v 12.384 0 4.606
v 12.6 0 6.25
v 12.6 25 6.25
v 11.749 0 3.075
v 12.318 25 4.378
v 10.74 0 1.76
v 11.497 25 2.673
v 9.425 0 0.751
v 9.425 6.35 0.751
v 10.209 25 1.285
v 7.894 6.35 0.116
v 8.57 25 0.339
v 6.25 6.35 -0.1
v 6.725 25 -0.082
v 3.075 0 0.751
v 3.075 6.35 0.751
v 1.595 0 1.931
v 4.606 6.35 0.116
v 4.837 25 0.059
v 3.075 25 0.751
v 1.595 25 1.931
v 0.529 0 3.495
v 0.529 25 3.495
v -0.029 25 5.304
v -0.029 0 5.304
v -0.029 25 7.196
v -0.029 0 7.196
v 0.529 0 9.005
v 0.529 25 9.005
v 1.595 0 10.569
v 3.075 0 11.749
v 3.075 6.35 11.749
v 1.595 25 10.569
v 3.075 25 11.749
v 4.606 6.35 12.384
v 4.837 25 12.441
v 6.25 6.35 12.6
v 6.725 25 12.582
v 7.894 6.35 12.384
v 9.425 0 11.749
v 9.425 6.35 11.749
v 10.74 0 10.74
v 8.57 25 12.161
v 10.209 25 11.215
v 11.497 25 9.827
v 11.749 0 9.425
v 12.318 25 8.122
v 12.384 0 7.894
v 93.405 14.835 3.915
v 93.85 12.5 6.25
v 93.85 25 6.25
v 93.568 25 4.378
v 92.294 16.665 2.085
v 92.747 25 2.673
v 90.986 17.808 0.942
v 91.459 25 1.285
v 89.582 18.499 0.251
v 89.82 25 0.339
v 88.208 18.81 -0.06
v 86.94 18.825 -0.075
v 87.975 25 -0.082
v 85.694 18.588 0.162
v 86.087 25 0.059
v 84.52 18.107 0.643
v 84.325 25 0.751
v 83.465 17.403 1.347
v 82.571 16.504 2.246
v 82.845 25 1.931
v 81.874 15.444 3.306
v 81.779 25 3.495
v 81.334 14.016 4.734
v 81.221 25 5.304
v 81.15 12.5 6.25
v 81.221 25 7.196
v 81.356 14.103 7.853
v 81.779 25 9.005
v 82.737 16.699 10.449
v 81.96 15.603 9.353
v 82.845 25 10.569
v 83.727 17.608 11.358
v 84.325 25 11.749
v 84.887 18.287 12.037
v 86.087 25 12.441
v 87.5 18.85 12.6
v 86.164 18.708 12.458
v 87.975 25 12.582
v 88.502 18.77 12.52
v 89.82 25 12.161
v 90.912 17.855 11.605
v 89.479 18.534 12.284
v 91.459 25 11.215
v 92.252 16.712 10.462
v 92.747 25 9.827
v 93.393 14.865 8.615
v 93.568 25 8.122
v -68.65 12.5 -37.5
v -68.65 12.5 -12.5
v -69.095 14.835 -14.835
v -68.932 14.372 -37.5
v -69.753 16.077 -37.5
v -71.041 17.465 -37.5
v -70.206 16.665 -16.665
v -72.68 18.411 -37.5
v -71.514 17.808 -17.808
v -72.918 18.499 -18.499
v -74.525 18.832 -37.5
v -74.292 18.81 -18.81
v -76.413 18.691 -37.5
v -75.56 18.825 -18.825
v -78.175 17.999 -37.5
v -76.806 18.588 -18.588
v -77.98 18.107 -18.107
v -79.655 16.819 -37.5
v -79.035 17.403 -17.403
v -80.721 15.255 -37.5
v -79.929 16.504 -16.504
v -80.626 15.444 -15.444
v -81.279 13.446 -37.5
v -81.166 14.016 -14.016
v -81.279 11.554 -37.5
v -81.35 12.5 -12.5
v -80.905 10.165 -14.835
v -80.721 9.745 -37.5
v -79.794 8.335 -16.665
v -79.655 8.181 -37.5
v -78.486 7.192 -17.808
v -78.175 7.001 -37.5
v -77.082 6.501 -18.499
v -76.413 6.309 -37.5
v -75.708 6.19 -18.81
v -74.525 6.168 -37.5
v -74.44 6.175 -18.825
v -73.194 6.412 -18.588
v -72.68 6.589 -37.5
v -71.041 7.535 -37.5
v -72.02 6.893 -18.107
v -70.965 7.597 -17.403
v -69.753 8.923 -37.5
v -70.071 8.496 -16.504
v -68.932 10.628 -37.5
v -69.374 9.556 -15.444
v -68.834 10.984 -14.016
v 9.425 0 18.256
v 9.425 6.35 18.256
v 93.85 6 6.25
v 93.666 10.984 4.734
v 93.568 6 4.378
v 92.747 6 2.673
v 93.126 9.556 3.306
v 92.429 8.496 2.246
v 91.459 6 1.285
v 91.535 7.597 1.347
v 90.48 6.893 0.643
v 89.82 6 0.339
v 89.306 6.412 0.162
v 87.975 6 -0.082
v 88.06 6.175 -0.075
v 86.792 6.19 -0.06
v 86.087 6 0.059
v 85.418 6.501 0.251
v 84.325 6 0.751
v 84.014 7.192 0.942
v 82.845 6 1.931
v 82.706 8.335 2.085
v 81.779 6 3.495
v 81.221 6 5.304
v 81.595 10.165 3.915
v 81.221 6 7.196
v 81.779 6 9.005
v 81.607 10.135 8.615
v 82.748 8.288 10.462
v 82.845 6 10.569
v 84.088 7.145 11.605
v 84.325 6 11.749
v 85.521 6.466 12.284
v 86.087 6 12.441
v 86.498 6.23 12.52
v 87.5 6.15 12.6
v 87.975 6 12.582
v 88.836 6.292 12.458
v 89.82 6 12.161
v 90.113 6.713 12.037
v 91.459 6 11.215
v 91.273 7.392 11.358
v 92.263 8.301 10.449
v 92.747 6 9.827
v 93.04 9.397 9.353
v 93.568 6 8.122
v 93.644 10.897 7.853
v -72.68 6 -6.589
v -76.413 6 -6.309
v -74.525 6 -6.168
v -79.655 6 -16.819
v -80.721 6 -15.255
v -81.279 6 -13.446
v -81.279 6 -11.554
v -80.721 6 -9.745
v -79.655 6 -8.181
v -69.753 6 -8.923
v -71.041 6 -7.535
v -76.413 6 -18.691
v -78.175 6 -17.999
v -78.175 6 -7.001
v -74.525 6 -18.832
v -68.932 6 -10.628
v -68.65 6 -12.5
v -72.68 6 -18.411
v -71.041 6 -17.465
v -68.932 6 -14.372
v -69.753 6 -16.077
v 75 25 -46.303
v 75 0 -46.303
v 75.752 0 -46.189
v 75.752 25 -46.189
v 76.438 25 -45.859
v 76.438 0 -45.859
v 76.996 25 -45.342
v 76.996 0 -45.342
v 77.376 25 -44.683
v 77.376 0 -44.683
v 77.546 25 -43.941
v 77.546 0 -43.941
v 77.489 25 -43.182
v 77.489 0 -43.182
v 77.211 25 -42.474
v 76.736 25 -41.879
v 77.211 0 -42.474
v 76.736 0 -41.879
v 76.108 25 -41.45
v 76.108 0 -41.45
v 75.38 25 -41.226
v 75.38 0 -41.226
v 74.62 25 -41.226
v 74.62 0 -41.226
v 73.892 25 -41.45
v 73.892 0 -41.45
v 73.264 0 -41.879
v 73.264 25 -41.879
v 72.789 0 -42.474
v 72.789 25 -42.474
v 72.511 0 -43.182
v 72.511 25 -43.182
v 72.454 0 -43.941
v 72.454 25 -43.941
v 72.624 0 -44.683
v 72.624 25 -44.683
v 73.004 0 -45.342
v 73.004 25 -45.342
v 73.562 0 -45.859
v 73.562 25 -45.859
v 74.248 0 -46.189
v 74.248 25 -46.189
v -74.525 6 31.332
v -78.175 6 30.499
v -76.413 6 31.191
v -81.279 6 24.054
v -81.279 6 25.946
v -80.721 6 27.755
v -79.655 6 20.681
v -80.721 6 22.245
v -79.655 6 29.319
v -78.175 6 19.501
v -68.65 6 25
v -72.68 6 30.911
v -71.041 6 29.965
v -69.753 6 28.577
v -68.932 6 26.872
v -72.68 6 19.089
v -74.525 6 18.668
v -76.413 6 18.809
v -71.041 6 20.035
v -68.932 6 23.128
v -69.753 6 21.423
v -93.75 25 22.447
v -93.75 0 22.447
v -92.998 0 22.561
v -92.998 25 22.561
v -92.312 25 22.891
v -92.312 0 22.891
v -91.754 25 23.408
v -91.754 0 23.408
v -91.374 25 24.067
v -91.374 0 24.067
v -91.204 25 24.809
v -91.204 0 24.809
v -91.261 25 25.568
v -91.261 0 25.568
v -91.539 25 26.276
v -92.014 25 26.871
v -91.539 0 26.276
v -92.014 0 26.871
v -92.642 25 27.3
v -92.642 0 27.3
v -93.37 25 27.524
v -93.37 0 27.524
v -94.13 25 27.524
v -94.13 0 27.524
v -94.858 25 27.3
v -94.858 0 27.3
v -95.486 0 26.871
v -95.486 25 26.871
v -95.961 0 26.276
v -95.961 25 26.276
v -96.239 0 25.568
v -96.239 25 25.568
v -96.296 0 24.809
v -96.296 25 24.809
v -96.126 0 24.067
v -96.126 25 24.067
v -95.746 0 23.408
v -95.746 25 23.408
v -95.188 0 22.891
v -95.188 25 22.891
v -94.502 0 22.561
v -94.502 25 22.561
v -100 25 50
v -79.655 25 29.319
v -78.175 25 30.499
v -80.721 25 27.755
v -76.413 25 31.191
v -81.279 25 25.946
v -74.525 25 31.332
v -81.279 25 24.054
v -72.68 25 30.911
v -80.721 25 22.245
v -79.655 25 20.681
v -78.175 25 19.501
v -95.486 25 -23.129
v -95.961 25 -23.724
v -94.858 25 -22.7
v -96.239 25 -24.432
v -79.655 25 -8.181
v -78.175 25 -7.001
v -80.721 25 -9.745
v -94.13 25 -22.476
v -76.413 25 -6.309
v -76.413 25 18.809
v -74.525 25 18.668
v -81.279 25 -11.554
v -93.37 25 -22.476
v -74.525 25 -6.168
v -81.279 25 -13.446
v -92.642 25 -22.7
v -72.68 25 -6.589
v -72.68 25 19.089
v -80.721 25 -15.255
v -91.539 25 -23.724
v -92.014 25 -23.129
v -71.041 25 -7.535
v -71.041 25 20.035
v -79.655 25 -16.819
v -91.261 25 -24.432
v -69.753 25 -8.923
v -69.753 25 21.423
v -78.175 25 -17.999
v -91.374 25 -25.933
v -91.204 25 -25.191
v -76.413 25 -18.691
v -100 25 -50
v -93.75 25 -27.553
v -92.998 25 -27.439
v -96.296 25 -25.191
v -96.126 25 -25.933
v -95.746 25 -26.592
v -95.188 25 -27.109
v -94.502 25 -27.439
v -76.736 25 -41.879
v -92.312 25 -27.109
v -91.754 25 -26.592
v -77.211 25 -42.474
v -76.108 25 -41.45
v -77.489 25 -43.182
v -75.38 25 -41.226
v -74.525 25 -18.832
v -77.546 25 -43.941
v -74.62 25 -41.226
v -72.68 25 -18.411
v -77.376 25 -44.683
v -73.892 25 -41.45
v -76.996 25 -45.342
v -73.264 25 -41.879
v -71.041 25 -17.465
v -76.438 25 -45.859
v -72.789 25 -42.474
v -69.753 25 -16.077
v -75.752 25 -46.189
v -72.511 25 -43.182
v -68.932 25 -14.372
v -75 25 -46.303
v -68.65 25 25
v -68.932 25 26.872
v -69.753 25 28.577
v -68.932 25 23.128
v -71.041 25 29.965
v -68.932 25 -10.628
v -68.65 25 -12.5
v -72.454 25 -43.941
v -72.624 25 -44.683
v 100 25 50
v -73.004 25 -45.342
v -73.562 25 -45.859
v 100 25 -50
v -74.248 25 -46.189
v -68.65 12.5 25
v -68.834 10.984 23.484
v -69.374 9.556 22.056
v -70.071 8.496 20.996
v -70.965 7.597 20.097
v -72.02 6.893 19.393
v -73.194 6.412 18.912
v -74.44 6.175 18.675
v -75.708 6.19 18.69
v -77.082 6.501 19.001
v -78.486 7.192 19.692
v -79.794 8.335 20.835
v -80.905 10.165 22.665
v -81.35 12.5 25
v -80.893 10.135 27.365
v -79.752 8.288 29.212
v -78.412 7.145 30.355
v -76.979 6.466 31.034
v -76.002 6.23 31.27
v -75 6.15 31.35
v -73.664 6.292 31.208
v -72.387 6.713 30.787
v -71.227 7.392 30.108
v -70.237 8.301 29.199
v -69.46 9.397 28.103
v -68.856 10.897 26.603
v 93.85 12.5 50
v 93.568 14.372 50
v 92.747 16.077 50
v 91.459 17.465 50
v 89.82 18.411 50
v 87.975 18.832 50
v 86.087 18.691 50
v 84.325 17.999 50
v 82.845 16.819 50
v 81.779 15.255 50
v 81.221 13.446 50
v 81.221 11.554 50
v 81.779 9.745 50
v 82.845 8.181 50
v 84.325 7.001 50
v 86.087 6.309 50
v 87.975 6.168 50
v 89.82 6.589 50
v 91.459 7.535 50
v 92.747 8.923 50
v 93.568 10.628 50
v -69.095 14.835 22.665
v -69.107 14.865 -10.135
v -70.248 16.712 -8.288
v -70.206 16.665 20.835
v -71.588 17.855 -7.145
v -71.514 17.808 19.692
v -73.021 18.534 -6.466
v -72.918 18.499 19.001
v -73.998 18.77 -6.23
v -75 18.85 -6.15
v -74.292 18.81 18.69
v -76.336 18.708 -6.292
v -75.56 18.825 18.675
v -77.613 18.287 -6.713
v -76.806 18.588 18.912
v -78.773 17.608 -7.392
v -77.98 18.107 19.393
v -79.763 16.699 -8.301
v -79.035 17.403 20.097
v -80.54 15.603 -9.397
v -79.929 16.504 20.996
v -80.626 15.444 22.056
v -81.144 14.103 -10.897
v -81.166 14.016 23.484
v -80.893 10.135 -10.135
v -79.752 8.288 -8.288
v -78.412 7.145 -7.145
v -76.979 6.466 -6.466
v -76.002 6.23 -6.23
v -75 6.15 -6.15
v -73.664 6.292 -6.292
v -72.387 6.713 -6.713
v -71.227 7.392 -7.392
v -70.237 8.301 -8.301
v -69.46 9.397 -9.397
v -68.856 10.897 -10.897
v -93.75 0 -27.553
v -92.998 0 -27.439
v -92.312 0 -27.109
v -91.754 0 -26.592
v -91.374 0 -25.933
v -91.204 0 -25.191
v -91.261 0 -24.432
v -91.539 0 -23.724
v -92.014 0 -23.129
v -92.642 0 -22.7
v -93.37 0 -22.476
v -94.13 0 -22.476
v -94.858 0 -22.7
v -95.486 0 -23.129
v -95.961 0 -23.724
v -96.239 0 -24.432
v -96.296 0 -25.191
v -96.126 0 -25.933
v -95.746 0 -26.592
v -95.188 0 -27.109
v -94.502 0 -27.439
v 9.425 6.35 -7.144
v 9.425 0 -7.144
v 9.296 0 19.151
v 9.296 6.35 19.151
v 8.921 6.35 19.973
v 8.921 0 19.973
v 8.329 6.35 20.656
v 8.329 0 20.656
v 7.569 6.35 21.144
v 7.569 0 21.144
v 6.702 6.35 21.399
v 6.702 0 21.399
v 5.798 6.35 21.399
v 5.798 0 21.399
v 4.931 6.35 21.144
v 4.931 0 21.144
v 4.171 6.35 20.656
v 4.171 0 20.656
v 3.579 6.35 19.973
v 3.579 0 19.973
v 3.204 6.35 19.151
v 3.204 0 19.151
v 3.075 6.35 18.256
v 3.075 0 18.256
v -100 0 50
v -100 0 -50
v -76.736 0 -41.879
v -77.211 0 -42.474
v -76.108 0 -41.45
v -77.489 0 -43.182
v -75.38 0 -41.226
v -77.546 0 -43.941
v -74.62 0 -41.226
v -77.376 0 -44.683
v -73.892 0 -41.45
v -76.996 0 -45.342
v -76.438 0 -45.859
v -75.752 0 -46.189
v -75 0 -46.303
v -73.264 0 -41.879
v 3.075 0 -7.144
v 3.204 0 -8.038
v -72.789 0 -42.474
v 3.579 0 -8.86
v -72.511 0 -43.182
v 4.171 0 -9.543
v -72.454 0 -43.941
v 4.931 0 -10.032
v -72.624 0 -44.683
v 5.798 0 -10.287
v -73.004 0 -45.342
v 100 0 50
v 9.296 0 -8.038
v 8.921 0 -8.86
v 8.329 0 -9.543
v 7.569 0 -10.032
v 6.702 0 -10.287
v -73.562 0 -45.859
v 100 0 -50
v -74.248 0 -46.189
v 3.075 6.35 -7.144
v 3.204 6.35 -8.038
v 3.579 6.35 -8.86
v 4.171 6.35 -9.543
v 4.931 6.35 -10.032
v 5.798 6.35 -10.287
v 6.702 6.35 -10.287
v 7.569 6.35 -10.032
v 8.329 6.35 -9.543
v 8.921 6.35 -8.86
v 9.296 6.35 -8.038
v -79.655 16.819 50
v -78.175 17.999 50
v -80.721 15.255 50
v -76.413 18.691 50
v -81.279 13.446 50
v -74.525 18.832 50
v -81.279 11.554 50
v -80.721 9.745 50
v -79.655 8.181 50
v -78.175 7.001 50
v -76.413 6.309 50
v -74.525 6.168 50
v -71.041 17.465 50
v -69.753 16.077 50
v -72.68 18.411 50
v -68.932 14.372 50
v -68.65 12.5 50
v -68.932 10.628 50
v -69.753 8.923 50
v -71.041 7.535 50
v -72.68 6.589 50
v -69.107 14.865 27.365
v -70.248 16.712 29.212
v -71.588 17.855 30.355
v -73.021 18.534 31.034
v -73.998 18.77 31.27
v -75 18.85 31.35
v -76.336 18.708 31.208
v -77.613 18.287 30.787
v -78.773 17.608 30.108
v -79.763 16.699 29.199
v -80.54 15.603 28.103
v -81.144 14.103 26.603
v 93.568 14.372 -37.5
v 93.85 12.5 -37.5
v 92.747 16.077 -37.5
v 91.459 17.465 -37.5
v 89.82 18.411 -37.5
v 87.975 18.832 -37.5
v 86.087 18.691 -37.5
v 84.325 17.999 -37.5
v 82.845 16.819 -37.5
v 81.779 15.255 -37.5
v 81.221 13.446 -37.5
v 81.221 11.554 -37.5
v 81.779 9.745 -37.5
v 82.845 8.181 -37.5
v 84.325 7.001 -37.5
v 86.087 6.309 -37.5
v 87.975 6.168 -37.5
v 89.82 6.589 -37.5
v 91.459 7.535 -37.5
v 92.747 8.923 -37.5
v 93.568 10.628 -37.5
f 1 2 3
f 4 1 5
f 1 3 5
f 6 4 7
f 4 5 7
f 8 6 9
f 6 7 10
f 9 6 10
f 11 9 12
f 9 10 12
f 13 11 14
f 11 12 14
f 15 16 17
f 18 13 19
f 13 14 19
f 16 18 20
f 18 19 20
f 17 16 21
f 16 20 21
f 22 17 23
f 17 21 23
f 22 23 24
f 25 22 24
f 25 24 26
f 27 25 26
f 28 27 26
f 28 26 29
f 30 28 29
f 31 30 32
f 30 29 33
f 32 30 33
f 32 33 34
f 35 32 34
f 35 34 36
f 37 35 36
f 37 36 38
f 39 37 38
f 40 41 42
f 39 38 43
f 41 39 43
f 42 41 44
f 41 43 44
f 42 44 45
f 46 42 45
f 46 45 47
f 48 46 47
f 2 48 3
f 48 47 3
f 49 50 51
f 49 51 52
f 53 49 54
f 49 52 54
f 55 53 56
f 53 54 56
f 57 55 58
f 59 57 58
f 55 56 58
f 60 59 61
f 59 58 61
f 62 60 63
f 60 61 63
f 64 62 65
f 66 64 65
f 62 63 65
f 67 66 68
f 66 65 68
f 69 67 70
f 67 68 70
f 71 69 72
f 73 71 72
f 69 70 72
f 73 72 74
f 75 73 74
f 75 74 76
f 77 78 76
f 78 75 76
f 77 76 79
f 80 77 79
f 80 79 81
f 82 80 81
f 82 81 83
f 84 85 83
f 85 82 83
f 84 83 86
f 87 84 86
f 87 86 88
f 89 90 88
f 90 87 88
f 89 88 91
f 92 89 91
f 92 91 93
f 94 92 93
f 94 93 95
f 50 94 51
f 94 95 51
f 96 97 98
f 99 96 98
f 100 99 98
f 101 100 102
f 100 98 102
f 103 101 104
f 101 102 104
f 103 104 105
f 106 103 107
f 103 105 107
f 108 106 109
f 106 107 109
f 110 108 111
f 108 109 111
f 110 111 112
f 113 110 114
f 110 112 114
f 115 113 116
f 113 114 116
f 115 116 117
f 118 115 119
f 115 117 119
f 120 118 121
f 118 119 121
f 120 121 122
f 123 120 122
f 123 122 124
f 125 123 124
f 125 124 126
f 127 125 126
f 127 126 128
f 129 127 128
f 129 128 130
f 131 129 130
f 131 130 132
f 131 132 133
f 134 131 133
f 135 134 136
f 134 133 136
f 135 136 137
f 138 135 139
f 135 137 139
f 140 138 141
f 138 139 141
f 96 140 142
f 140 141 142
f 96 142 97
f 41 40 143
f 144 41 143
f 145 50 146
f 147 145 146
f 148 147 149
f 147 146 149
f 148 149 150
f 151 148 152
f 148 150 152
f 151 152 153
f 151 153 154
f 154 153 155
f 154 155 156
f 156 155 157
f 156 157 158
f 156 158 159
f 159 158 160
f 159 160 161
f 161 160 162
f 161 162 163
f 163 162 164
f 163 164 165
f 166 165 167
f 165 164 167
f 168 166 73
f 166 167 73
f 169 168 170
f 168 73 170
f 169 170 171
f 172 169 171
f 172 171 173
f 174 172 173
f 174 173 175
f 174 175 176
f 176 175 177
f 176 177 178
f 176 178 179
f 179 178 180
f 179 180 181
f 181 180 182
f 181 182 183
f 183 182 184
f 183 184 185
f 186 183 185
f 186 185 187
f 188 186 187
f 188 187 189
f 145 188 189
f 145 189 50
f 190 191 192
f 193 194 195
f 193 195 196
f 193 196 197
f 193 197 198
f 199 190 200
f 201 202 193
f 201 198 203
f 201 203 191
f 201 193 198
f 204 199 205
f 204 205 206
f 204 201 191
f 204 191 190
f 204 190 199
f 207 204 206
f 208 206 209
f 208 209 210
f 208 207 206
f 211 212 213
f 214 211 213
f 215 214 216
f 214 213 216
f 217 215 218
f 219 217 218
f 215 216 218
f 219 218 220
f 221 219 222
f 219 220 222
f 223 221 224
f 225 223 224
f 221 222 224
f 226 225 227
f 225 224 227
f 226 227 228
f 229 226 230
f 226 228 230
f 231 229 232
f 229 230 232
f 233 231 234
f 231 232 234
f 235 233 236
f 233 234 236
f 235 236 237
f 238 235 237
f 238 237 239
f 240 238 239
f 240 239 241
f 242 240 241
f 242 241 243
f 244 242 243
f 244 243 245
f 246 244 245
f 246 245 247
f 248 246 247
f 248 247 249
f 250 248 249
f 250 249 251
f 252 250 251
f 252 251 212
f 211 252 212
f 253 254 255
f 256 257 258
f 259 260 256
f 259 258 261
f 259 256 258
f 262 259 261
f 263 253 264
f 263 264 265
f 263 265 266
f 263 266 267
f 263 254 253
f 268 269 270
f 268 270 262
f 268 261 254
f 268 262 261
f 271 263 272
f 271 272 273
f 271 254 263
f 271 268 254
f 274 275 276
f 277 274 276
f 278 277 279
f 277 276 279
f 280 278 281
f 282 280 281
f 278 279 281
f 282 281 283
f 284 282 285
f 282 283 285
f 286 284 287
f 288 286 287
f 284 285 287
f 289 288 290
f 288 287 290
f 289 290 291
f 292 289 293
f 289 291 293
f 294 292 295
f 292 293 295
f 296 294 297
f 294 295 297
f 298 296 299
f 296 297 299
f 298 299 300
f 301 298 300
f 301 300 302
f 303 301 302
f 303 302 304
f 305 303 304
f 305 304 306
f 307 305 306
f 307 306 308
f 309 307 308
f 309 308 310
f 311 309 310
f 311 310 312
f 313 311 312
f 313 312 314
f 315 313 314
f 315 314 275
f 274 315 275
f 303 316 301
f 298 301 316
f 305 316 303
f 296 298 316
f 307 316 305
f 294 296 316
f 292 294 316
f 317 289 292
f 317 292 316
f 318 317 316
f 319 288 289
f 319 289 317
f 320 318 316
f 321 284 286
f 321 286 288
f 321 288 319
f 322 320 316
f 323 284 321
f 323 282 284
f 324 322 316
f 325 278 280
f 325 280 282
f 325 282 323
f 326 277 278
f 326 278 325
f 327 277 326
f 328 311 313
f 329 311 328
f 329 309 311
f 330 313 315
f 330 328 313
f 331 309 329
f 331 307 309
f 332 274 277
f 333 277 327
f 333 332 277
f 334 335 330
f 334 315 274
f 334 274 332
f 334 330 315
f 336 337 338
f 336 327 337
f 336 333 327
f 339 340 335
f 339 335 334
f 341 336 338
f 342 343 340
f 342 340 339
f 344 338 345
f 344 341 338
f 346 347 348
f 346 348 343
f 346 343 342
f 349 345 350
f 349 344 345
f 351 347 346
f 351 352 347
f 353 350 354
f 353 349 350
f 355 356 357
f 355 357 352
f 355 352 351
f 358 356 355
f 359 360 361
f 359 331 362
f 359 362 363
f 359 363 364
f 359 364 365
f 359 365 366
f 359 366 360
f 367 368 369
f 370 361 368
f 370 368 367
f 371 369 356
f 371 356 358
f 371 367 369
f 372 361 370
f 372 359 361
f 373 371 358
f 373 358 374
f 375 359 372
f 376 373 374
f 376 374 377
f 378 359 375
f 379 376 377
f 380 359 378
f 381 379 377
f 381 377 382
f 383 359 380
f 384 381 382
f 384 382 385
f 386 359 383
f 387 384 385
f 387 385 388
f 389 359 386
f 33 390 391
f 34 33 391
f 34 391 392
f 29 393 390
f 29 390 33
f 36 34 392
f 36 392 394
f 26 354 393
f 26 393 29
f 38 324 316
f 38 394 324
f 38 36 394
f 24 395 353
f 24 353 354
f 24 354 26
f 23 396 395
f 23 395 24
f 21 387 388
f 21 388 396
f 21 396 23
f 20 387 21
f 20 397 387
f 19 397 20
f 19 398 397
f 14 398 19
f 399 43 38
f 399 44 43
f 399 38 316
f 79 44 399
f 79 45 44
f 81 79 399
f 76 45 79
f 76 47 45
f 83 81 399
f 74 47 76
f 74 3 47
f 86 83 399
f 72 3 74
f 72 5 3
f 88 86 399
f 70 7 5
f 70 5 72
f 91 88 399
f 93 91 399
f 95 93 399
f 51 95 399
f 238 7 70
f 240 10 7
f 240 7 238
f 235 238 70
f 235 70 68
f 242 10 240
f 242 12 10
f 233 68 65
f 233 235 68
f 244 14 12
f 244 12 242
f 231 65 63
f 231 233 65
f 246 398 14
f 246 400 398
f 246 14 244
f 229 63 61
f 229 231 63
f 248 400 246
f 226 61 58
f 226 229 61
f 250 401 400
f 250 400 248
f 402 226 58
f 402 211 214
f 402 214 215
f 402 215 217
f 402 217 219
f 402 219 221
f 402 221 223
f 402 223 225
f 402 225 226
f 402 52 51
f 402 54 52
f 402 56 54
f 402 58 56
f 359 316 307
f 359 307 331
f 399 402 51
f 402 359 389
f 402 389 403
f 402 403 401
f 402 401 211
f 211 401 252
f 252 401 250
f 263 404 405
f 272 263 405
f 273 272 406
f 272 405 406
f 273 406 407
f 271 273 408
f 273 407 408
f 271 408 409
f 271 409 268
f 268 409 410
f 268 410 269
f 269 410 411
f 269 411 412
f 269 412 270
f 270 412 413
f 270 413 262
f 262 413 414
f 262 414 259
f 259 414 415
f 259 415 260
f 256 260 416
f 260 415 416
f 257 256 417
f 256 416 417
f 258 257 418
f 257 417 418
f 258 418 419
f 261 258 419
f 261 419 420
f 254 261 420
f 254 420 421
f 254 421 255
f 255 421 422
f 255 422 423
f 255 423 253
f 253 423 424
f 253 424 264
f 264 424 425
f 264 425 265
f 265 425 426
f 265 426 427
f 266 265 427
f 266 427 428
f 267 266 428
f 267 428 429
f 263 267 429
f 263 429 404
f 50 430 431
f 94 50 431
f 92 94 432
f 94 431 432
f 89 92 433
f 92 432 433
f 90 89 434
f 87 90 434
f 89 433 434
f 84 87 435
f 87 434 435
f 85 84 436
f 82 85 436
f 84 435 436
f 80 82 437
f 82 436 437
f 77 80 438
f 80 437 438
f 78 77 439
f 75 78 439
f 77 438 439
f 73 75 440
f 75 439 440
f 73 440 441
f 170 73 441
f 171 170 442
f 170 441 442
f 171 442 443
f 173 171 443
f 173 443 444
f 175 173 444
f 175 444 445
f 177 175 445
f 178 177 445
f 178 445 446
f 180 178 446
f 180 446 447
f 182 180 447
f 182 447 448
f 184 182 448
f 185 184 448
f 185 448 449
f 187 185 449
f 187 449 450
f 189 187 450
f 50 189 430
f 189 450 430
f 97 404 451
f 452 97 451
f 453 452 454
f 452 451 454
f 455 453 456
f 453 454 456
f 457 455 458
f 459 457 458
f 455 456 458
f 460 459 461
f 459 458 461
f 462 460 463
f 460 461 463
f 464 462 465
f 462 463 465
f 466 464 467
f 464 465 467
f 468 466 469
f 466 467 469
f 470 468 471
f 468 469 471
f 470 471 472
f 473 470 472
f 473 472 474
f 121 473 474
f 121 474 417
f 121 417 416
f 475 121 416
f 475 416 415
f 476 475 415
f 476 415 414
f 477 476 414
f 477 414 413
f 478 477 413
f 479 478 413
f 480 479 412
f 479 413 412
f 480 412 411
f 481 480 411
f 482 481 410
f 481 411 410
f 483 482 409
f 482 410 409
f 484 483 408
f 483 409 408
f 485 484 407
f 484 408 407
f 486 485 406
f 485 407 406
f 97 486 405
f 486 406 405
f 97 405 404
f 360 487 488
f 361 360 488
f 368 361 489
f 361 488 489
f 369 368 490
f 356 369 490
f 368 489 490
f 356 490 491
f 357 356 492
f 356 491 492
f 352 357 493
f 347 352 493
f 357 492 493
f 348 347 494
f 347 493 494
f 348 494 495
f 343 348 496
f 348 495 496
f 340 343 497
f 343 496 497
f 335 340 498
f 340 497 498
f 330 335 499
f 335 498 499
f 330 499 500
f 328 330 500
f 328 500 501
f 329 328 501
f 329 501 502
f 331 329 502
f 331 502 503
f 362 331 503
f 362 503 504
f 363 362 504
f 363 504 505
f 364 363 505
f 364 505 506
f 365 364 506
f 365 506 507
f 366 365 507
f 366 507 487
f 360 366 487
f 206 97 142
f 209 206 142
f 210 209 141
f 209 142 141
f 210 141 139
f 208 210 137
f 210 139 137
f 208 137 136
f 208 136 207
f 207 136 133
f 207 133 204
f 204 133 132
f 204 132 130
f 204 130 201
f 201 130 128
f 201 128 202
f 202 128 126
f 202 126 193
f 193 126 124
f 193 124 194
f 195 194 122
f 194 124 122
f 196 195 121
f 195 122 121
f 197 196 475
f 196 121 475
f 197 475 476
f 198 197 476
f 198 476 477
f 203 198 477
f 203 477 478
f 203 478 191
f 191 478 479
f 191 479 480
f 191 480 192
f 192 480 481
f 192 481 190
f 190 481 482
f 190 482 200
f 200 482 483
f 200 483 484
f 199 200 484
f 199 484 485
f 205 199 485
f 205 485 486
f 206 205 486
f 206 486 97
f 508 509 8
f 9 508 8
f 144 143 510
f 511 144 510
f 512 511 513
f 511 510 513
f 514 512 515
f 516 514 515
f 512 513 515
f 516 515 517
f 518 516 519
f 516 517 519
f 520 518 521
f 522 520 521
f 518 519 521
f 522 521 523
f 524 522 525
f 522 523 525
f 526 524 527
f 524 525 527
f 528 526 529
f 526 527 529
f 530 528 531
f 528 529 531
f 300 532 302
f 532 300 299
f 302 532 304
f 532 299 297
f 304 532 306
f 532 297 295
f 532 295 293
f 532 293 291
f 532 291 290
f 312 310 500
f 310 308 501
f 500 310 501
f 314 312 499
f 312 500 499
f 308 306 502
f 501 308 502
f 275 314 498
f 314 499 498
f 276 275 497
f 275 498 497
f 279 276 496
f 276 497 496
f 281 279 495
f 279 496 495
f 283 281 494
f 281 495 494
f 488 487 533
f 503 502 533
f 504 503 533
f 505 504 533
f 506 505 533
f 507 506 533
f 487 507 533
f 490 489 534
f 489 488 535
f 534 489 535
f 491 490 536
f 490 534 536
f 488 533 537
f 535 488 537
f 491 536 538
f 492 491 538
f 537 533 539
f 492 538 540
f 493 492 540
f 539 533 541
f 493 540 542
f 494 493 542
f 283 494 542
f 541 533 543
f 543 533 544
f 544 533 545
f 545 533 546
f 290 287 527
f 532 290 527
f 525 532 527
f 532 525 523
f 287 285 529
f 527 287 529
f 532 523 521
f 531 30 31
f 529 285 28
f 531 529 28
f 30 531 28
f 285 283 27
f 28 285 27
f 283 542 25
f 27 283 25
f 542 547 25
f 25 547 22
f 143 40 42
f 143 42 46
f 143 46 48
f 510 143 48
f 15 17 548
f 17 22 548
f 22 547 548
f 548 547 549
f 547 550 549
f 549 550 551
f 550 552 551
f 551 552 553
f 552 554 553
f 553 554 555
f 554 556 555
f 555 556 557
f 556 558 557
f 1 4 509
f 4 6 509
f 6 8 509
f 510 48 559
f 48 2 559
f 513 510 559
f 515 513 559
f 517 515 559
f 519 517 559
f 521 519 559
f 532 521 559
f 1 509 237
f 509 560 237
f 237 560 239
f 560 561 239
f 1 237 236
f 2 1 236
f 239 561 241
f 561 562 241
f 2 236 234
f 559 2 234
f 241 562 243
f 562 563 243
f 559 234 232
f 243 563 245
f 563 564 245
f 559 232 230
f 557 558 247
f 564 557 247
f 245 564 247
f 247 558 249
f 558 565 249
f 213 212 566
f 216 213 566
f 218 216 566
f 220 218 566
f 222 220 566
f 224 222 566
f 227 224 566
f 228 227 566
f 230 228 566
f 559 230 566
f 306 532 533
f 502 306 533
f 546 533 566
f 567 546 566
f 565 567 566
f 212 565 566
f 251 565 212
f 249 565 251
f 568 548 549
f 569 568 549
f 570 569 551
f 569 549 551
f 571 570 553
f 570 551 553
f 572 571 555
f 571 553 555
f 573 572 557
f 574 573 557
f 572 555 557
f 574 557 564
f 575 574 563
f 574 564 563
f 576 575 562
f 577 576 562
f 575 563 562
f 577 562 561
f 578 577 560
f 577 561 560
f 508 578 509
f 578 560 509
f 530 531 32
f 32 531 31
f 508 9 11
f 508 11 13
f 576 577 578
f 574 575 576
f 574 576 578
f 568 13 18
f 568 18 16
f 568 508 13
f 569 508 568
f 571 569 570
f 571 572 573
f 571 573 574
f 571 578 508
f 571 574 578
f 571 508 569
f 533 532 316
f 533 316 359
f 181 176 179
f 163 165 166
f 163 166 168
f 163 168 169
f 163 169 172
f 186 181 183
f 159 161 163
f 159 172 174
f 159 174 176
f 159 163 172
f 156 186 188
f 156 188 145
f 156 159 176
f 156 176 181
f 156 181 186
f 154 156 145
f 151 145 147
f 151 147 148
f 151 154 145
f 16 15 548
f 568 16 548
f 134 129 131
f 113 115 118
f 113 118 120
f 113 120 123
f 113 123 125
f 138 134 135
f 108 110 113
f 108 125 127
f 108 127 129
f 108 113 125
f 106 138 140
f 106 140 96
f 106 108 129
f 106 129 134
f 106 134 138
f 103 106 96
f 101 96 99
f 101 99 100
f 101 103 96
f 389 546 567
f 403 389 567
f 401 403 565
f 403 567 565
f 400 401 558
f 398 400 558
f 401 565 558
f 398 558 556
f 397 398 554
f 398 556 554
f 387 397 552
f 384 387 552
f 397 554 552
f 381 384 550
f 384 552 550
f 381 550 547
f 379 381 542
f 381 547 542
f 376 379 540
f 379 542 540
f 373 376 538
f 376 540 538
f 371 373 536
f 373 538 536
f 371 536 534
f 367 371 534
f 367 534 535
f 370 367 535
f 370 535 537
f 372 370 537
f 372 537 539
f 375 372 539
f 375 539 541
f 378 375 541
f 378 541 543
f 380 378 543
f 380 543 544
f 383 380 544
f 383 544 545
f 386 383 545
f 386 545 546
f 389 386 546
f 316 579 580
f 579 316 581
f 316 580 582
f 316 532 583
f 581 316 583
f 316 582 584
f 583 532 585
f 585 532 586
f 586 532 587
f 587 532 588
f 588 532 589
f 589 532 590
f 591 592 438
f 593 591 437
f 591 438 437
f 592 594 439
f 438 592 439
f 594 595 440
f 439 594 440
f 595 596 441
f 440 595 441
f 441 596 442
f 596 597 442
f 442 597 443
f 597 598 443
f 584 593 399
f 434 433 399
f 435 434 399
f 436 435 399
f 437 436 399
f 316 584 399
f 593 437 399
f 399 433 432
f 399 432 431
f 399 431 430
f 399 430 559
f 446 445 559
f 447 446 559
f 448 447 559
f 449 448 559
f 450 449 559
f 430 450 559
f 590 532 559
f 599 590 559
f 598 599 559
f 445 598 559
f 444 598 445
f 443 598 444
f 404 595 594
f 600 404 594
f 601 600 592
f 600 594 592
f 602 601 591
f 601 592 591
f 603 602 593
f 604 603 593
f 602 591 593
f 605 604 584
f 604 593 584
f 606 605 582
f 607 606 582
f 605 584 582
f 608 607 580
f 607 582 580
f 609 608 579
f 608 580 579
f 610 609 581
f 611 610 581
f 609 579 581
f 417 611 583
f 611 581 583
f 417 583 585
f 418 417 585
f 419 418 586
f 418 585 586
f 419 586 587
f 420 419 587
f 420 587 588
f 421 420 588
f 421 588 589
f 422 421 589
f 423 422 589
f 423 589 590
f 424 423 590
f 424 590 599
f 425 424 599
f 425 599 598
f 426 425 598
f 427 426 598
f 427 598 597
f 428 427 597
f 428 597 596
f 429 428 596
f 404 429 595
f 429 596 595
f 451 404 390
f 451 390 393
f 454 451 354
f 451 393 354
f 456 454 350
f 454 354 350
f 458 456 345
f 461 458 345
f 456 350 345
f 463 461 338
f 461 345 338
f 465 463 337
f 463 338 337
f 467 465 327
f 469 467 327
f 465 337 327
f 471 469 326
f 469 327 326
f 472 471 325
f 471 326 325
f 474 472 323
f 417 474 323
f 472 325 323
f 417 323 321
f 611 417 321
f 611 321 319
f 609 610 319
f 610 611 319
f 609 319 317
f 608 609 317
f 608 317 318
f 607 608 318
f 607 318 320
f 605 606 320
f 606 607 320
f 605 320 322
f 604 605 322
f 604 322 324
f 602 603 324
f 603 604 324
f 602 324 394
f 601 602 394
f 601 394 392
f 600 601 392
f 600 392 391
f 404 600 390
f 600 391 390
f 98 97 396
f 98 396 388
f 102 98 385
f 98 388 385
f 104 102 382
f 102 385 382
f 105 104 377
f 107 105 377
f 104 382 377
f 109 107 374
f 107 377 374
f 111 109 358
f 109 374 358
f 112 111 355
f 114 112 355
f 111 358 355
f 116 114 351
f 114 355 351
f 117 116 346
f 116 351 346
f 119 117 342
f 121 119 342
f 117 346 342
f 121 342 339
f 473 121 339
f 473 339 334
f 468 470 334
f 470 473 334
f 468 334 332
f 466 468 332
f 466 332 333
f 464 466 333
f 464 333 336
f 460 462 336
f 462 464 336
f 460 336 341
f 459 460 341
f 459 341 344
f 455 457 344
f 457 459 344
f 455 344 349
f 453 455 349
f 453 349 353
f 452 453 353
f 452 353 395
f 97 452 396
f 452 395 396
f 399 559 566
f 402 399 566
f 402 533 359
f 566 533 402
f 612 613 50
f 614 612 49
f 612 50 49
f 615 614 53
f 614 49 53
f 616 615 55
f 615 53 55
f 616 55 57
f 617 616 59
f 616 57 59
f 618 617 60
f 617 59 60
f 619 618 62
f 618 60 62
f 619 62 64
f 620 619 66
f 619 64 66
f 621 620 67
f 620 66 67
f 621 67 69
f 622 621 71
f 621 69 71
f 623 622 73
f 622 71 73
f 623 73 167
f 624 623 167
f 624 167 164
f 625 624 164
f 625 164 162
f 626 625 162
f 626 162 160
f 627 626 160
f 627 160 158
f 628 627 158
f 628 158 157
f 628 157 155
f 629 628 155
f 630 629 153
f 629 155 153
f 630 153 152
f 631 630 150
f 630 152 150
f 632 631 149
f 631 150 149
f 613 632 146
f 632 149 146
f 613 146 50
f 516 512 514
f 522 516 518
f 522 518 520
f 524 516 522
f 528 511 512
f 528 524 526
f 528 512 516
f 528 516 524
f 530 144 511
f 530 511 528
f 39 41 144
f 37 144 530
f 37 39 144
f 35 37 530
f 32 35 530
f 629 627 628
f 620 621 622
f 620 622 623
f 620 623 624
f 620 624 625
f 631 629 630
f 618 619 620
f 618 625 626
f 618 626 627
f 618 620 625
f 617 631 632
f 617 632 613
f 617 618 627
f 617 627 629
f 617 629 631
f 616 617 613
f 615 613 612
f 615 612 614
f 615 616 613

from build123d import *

# Parameters (mm, degrees)
SKETCH1_W                   = 200
SKETCH1_H                   = 100
BOSS_EXTRUDE1_DEPTH         = 25
SKETCH2_R                   = 6.35
CUT_EXTRUDE1_DEPTH          = 87.5
SKETCH3_R                   = 6.35
CUT_EXTRUDE2_DEPTH          = 19
CUT_EXTRUDE3_REACH          = 27
SKETCH4_R                   = 6.35
CUT_EXTRUDE4_DEPTH          = 6.35
F_1_4_20_TAPPED_HOLE1_D     = 5.1054
F_1_4_20_TAPPED_HOLE1_DEPTH = 25


with BuildPart() as part:
    # Sketch1 → Boss-Extrude1 (new body)
    with BuildSketch(Plane(origin=(0, 0, 0), x_dir=(1, 0, 0), z_dir=(0, 1, 0))):
        Rectangle(SKETCH1_W, SKETCH1_H)
    extrude(amount=BOSS_EXTRUDE1_DEPTH)

    # Sketch2 → Cut-Extrude1 (cut)
    with BuildSketch(Plane.XY.offset(50)):
        with Locations((-75, 12.5)):
            Circle(SKETCH2_R)
        with Locations((87.500000108, 12.5)):
            Circle(SKETCH2_R)
    extrude(amount=-CUT_EXTRUDE1_DEPTH, mode=Mode.SUBTRACT)

    # Sketch3 → Cut-Extrude2 (cut)
    with BuildSketch(Plane(origin=(0, 25, 0), x_dir=(1, 0, 0), z_dir=(0, 1, 0))):
        with Locations((-75, 12.5)):
            Circle(SKETCH3_R)
        with Locations((-75, -25)):
            Circle(SKETCH3_R)
        with Locations((87.500000108, -6.25)):
            Circle(SKETCH3_R)
    extrude(amount=-CUT_EXTRUDE2_DEPTH, mode=Mode.SUBTRACT)

    # Sketch4 → Cut-Extrude3 (cut, up to next)
    with BuildSketch(Plane(origin=(0, 25, 0), x_dir=(1, 0, 0), z_dir=(0, 1, 0)), mode=Mode.PRIVATE) as cut_extrude3_sk1:
        with Locations((6.25, -6.25)):
            Circle(SKETCH4_R)
    cut_extrude3_tool1 = extrude(cut_extrude3_sk1.sketch, amount=-CUT_EXTRUDE3_REACH, mode=Mode.PRIVATE) & part.part
    add(cut_extrude3_tool1.solids().sort_by_distance((6.25, 25, 6.25))[0], mode=Mode.SUBTRACT)

    # Sketch5 → Cut-Extrude4 (cut)
    with BuildSketch(Plane(origin=(0, 0, 0), x_dir=(-1, 0, 0), z_dir=(0, -1, 0))):
        with BuildLine():
            Line((-9.425, 7.143897512), (-9.425, -0.750738686))
            ThreePointArc((-9.425, -0.750738686), (-6.25, 0.1), (-3.075, -0.750738686))
            Line((-3.075, -0.750738686), (-3.075, 7.143897512))
            ThreePointArc((-3.075, 7.143897512), (-6.25, 10.318897512), (-9.425, 7.143897512))
        make_face()
        with BuildLine():
            Line((-9.425, -11.749261314), (-9.425, -18.256102488))
            ThreePointArc((-9.425, -18.256102488), (-6.25, -21.431102488), (-3.075, -18.256102488))
            Line((-3.075, -18.256102488), (-3.075, -11.749261314))
            ThreePointArc((-3.075, -11.749261314), (-6.25, -12.6), (-9.425, -11.749261314))
        make_face()
    extrude(amount=-CUT_EXTRUDE4_DEPTH, mode=Mode.SUBTRACT)

    # 1/4-20 Tapped Hole1
    with Locations(Plane(origin=(-75, 25, -43.75), x_dir=(0, 0, 1), z_dir=(0, 1, 0))):
        with Locations((0, 0), (0, 150), (18.75, -18.75), (68.75, -18.75)):
            Hole(F_1_4_20_TAPPED_HOLE1_D / 2, depth=F_1_4_20_TAPPED_HOLE1_DEPTH)


solid = part.part
